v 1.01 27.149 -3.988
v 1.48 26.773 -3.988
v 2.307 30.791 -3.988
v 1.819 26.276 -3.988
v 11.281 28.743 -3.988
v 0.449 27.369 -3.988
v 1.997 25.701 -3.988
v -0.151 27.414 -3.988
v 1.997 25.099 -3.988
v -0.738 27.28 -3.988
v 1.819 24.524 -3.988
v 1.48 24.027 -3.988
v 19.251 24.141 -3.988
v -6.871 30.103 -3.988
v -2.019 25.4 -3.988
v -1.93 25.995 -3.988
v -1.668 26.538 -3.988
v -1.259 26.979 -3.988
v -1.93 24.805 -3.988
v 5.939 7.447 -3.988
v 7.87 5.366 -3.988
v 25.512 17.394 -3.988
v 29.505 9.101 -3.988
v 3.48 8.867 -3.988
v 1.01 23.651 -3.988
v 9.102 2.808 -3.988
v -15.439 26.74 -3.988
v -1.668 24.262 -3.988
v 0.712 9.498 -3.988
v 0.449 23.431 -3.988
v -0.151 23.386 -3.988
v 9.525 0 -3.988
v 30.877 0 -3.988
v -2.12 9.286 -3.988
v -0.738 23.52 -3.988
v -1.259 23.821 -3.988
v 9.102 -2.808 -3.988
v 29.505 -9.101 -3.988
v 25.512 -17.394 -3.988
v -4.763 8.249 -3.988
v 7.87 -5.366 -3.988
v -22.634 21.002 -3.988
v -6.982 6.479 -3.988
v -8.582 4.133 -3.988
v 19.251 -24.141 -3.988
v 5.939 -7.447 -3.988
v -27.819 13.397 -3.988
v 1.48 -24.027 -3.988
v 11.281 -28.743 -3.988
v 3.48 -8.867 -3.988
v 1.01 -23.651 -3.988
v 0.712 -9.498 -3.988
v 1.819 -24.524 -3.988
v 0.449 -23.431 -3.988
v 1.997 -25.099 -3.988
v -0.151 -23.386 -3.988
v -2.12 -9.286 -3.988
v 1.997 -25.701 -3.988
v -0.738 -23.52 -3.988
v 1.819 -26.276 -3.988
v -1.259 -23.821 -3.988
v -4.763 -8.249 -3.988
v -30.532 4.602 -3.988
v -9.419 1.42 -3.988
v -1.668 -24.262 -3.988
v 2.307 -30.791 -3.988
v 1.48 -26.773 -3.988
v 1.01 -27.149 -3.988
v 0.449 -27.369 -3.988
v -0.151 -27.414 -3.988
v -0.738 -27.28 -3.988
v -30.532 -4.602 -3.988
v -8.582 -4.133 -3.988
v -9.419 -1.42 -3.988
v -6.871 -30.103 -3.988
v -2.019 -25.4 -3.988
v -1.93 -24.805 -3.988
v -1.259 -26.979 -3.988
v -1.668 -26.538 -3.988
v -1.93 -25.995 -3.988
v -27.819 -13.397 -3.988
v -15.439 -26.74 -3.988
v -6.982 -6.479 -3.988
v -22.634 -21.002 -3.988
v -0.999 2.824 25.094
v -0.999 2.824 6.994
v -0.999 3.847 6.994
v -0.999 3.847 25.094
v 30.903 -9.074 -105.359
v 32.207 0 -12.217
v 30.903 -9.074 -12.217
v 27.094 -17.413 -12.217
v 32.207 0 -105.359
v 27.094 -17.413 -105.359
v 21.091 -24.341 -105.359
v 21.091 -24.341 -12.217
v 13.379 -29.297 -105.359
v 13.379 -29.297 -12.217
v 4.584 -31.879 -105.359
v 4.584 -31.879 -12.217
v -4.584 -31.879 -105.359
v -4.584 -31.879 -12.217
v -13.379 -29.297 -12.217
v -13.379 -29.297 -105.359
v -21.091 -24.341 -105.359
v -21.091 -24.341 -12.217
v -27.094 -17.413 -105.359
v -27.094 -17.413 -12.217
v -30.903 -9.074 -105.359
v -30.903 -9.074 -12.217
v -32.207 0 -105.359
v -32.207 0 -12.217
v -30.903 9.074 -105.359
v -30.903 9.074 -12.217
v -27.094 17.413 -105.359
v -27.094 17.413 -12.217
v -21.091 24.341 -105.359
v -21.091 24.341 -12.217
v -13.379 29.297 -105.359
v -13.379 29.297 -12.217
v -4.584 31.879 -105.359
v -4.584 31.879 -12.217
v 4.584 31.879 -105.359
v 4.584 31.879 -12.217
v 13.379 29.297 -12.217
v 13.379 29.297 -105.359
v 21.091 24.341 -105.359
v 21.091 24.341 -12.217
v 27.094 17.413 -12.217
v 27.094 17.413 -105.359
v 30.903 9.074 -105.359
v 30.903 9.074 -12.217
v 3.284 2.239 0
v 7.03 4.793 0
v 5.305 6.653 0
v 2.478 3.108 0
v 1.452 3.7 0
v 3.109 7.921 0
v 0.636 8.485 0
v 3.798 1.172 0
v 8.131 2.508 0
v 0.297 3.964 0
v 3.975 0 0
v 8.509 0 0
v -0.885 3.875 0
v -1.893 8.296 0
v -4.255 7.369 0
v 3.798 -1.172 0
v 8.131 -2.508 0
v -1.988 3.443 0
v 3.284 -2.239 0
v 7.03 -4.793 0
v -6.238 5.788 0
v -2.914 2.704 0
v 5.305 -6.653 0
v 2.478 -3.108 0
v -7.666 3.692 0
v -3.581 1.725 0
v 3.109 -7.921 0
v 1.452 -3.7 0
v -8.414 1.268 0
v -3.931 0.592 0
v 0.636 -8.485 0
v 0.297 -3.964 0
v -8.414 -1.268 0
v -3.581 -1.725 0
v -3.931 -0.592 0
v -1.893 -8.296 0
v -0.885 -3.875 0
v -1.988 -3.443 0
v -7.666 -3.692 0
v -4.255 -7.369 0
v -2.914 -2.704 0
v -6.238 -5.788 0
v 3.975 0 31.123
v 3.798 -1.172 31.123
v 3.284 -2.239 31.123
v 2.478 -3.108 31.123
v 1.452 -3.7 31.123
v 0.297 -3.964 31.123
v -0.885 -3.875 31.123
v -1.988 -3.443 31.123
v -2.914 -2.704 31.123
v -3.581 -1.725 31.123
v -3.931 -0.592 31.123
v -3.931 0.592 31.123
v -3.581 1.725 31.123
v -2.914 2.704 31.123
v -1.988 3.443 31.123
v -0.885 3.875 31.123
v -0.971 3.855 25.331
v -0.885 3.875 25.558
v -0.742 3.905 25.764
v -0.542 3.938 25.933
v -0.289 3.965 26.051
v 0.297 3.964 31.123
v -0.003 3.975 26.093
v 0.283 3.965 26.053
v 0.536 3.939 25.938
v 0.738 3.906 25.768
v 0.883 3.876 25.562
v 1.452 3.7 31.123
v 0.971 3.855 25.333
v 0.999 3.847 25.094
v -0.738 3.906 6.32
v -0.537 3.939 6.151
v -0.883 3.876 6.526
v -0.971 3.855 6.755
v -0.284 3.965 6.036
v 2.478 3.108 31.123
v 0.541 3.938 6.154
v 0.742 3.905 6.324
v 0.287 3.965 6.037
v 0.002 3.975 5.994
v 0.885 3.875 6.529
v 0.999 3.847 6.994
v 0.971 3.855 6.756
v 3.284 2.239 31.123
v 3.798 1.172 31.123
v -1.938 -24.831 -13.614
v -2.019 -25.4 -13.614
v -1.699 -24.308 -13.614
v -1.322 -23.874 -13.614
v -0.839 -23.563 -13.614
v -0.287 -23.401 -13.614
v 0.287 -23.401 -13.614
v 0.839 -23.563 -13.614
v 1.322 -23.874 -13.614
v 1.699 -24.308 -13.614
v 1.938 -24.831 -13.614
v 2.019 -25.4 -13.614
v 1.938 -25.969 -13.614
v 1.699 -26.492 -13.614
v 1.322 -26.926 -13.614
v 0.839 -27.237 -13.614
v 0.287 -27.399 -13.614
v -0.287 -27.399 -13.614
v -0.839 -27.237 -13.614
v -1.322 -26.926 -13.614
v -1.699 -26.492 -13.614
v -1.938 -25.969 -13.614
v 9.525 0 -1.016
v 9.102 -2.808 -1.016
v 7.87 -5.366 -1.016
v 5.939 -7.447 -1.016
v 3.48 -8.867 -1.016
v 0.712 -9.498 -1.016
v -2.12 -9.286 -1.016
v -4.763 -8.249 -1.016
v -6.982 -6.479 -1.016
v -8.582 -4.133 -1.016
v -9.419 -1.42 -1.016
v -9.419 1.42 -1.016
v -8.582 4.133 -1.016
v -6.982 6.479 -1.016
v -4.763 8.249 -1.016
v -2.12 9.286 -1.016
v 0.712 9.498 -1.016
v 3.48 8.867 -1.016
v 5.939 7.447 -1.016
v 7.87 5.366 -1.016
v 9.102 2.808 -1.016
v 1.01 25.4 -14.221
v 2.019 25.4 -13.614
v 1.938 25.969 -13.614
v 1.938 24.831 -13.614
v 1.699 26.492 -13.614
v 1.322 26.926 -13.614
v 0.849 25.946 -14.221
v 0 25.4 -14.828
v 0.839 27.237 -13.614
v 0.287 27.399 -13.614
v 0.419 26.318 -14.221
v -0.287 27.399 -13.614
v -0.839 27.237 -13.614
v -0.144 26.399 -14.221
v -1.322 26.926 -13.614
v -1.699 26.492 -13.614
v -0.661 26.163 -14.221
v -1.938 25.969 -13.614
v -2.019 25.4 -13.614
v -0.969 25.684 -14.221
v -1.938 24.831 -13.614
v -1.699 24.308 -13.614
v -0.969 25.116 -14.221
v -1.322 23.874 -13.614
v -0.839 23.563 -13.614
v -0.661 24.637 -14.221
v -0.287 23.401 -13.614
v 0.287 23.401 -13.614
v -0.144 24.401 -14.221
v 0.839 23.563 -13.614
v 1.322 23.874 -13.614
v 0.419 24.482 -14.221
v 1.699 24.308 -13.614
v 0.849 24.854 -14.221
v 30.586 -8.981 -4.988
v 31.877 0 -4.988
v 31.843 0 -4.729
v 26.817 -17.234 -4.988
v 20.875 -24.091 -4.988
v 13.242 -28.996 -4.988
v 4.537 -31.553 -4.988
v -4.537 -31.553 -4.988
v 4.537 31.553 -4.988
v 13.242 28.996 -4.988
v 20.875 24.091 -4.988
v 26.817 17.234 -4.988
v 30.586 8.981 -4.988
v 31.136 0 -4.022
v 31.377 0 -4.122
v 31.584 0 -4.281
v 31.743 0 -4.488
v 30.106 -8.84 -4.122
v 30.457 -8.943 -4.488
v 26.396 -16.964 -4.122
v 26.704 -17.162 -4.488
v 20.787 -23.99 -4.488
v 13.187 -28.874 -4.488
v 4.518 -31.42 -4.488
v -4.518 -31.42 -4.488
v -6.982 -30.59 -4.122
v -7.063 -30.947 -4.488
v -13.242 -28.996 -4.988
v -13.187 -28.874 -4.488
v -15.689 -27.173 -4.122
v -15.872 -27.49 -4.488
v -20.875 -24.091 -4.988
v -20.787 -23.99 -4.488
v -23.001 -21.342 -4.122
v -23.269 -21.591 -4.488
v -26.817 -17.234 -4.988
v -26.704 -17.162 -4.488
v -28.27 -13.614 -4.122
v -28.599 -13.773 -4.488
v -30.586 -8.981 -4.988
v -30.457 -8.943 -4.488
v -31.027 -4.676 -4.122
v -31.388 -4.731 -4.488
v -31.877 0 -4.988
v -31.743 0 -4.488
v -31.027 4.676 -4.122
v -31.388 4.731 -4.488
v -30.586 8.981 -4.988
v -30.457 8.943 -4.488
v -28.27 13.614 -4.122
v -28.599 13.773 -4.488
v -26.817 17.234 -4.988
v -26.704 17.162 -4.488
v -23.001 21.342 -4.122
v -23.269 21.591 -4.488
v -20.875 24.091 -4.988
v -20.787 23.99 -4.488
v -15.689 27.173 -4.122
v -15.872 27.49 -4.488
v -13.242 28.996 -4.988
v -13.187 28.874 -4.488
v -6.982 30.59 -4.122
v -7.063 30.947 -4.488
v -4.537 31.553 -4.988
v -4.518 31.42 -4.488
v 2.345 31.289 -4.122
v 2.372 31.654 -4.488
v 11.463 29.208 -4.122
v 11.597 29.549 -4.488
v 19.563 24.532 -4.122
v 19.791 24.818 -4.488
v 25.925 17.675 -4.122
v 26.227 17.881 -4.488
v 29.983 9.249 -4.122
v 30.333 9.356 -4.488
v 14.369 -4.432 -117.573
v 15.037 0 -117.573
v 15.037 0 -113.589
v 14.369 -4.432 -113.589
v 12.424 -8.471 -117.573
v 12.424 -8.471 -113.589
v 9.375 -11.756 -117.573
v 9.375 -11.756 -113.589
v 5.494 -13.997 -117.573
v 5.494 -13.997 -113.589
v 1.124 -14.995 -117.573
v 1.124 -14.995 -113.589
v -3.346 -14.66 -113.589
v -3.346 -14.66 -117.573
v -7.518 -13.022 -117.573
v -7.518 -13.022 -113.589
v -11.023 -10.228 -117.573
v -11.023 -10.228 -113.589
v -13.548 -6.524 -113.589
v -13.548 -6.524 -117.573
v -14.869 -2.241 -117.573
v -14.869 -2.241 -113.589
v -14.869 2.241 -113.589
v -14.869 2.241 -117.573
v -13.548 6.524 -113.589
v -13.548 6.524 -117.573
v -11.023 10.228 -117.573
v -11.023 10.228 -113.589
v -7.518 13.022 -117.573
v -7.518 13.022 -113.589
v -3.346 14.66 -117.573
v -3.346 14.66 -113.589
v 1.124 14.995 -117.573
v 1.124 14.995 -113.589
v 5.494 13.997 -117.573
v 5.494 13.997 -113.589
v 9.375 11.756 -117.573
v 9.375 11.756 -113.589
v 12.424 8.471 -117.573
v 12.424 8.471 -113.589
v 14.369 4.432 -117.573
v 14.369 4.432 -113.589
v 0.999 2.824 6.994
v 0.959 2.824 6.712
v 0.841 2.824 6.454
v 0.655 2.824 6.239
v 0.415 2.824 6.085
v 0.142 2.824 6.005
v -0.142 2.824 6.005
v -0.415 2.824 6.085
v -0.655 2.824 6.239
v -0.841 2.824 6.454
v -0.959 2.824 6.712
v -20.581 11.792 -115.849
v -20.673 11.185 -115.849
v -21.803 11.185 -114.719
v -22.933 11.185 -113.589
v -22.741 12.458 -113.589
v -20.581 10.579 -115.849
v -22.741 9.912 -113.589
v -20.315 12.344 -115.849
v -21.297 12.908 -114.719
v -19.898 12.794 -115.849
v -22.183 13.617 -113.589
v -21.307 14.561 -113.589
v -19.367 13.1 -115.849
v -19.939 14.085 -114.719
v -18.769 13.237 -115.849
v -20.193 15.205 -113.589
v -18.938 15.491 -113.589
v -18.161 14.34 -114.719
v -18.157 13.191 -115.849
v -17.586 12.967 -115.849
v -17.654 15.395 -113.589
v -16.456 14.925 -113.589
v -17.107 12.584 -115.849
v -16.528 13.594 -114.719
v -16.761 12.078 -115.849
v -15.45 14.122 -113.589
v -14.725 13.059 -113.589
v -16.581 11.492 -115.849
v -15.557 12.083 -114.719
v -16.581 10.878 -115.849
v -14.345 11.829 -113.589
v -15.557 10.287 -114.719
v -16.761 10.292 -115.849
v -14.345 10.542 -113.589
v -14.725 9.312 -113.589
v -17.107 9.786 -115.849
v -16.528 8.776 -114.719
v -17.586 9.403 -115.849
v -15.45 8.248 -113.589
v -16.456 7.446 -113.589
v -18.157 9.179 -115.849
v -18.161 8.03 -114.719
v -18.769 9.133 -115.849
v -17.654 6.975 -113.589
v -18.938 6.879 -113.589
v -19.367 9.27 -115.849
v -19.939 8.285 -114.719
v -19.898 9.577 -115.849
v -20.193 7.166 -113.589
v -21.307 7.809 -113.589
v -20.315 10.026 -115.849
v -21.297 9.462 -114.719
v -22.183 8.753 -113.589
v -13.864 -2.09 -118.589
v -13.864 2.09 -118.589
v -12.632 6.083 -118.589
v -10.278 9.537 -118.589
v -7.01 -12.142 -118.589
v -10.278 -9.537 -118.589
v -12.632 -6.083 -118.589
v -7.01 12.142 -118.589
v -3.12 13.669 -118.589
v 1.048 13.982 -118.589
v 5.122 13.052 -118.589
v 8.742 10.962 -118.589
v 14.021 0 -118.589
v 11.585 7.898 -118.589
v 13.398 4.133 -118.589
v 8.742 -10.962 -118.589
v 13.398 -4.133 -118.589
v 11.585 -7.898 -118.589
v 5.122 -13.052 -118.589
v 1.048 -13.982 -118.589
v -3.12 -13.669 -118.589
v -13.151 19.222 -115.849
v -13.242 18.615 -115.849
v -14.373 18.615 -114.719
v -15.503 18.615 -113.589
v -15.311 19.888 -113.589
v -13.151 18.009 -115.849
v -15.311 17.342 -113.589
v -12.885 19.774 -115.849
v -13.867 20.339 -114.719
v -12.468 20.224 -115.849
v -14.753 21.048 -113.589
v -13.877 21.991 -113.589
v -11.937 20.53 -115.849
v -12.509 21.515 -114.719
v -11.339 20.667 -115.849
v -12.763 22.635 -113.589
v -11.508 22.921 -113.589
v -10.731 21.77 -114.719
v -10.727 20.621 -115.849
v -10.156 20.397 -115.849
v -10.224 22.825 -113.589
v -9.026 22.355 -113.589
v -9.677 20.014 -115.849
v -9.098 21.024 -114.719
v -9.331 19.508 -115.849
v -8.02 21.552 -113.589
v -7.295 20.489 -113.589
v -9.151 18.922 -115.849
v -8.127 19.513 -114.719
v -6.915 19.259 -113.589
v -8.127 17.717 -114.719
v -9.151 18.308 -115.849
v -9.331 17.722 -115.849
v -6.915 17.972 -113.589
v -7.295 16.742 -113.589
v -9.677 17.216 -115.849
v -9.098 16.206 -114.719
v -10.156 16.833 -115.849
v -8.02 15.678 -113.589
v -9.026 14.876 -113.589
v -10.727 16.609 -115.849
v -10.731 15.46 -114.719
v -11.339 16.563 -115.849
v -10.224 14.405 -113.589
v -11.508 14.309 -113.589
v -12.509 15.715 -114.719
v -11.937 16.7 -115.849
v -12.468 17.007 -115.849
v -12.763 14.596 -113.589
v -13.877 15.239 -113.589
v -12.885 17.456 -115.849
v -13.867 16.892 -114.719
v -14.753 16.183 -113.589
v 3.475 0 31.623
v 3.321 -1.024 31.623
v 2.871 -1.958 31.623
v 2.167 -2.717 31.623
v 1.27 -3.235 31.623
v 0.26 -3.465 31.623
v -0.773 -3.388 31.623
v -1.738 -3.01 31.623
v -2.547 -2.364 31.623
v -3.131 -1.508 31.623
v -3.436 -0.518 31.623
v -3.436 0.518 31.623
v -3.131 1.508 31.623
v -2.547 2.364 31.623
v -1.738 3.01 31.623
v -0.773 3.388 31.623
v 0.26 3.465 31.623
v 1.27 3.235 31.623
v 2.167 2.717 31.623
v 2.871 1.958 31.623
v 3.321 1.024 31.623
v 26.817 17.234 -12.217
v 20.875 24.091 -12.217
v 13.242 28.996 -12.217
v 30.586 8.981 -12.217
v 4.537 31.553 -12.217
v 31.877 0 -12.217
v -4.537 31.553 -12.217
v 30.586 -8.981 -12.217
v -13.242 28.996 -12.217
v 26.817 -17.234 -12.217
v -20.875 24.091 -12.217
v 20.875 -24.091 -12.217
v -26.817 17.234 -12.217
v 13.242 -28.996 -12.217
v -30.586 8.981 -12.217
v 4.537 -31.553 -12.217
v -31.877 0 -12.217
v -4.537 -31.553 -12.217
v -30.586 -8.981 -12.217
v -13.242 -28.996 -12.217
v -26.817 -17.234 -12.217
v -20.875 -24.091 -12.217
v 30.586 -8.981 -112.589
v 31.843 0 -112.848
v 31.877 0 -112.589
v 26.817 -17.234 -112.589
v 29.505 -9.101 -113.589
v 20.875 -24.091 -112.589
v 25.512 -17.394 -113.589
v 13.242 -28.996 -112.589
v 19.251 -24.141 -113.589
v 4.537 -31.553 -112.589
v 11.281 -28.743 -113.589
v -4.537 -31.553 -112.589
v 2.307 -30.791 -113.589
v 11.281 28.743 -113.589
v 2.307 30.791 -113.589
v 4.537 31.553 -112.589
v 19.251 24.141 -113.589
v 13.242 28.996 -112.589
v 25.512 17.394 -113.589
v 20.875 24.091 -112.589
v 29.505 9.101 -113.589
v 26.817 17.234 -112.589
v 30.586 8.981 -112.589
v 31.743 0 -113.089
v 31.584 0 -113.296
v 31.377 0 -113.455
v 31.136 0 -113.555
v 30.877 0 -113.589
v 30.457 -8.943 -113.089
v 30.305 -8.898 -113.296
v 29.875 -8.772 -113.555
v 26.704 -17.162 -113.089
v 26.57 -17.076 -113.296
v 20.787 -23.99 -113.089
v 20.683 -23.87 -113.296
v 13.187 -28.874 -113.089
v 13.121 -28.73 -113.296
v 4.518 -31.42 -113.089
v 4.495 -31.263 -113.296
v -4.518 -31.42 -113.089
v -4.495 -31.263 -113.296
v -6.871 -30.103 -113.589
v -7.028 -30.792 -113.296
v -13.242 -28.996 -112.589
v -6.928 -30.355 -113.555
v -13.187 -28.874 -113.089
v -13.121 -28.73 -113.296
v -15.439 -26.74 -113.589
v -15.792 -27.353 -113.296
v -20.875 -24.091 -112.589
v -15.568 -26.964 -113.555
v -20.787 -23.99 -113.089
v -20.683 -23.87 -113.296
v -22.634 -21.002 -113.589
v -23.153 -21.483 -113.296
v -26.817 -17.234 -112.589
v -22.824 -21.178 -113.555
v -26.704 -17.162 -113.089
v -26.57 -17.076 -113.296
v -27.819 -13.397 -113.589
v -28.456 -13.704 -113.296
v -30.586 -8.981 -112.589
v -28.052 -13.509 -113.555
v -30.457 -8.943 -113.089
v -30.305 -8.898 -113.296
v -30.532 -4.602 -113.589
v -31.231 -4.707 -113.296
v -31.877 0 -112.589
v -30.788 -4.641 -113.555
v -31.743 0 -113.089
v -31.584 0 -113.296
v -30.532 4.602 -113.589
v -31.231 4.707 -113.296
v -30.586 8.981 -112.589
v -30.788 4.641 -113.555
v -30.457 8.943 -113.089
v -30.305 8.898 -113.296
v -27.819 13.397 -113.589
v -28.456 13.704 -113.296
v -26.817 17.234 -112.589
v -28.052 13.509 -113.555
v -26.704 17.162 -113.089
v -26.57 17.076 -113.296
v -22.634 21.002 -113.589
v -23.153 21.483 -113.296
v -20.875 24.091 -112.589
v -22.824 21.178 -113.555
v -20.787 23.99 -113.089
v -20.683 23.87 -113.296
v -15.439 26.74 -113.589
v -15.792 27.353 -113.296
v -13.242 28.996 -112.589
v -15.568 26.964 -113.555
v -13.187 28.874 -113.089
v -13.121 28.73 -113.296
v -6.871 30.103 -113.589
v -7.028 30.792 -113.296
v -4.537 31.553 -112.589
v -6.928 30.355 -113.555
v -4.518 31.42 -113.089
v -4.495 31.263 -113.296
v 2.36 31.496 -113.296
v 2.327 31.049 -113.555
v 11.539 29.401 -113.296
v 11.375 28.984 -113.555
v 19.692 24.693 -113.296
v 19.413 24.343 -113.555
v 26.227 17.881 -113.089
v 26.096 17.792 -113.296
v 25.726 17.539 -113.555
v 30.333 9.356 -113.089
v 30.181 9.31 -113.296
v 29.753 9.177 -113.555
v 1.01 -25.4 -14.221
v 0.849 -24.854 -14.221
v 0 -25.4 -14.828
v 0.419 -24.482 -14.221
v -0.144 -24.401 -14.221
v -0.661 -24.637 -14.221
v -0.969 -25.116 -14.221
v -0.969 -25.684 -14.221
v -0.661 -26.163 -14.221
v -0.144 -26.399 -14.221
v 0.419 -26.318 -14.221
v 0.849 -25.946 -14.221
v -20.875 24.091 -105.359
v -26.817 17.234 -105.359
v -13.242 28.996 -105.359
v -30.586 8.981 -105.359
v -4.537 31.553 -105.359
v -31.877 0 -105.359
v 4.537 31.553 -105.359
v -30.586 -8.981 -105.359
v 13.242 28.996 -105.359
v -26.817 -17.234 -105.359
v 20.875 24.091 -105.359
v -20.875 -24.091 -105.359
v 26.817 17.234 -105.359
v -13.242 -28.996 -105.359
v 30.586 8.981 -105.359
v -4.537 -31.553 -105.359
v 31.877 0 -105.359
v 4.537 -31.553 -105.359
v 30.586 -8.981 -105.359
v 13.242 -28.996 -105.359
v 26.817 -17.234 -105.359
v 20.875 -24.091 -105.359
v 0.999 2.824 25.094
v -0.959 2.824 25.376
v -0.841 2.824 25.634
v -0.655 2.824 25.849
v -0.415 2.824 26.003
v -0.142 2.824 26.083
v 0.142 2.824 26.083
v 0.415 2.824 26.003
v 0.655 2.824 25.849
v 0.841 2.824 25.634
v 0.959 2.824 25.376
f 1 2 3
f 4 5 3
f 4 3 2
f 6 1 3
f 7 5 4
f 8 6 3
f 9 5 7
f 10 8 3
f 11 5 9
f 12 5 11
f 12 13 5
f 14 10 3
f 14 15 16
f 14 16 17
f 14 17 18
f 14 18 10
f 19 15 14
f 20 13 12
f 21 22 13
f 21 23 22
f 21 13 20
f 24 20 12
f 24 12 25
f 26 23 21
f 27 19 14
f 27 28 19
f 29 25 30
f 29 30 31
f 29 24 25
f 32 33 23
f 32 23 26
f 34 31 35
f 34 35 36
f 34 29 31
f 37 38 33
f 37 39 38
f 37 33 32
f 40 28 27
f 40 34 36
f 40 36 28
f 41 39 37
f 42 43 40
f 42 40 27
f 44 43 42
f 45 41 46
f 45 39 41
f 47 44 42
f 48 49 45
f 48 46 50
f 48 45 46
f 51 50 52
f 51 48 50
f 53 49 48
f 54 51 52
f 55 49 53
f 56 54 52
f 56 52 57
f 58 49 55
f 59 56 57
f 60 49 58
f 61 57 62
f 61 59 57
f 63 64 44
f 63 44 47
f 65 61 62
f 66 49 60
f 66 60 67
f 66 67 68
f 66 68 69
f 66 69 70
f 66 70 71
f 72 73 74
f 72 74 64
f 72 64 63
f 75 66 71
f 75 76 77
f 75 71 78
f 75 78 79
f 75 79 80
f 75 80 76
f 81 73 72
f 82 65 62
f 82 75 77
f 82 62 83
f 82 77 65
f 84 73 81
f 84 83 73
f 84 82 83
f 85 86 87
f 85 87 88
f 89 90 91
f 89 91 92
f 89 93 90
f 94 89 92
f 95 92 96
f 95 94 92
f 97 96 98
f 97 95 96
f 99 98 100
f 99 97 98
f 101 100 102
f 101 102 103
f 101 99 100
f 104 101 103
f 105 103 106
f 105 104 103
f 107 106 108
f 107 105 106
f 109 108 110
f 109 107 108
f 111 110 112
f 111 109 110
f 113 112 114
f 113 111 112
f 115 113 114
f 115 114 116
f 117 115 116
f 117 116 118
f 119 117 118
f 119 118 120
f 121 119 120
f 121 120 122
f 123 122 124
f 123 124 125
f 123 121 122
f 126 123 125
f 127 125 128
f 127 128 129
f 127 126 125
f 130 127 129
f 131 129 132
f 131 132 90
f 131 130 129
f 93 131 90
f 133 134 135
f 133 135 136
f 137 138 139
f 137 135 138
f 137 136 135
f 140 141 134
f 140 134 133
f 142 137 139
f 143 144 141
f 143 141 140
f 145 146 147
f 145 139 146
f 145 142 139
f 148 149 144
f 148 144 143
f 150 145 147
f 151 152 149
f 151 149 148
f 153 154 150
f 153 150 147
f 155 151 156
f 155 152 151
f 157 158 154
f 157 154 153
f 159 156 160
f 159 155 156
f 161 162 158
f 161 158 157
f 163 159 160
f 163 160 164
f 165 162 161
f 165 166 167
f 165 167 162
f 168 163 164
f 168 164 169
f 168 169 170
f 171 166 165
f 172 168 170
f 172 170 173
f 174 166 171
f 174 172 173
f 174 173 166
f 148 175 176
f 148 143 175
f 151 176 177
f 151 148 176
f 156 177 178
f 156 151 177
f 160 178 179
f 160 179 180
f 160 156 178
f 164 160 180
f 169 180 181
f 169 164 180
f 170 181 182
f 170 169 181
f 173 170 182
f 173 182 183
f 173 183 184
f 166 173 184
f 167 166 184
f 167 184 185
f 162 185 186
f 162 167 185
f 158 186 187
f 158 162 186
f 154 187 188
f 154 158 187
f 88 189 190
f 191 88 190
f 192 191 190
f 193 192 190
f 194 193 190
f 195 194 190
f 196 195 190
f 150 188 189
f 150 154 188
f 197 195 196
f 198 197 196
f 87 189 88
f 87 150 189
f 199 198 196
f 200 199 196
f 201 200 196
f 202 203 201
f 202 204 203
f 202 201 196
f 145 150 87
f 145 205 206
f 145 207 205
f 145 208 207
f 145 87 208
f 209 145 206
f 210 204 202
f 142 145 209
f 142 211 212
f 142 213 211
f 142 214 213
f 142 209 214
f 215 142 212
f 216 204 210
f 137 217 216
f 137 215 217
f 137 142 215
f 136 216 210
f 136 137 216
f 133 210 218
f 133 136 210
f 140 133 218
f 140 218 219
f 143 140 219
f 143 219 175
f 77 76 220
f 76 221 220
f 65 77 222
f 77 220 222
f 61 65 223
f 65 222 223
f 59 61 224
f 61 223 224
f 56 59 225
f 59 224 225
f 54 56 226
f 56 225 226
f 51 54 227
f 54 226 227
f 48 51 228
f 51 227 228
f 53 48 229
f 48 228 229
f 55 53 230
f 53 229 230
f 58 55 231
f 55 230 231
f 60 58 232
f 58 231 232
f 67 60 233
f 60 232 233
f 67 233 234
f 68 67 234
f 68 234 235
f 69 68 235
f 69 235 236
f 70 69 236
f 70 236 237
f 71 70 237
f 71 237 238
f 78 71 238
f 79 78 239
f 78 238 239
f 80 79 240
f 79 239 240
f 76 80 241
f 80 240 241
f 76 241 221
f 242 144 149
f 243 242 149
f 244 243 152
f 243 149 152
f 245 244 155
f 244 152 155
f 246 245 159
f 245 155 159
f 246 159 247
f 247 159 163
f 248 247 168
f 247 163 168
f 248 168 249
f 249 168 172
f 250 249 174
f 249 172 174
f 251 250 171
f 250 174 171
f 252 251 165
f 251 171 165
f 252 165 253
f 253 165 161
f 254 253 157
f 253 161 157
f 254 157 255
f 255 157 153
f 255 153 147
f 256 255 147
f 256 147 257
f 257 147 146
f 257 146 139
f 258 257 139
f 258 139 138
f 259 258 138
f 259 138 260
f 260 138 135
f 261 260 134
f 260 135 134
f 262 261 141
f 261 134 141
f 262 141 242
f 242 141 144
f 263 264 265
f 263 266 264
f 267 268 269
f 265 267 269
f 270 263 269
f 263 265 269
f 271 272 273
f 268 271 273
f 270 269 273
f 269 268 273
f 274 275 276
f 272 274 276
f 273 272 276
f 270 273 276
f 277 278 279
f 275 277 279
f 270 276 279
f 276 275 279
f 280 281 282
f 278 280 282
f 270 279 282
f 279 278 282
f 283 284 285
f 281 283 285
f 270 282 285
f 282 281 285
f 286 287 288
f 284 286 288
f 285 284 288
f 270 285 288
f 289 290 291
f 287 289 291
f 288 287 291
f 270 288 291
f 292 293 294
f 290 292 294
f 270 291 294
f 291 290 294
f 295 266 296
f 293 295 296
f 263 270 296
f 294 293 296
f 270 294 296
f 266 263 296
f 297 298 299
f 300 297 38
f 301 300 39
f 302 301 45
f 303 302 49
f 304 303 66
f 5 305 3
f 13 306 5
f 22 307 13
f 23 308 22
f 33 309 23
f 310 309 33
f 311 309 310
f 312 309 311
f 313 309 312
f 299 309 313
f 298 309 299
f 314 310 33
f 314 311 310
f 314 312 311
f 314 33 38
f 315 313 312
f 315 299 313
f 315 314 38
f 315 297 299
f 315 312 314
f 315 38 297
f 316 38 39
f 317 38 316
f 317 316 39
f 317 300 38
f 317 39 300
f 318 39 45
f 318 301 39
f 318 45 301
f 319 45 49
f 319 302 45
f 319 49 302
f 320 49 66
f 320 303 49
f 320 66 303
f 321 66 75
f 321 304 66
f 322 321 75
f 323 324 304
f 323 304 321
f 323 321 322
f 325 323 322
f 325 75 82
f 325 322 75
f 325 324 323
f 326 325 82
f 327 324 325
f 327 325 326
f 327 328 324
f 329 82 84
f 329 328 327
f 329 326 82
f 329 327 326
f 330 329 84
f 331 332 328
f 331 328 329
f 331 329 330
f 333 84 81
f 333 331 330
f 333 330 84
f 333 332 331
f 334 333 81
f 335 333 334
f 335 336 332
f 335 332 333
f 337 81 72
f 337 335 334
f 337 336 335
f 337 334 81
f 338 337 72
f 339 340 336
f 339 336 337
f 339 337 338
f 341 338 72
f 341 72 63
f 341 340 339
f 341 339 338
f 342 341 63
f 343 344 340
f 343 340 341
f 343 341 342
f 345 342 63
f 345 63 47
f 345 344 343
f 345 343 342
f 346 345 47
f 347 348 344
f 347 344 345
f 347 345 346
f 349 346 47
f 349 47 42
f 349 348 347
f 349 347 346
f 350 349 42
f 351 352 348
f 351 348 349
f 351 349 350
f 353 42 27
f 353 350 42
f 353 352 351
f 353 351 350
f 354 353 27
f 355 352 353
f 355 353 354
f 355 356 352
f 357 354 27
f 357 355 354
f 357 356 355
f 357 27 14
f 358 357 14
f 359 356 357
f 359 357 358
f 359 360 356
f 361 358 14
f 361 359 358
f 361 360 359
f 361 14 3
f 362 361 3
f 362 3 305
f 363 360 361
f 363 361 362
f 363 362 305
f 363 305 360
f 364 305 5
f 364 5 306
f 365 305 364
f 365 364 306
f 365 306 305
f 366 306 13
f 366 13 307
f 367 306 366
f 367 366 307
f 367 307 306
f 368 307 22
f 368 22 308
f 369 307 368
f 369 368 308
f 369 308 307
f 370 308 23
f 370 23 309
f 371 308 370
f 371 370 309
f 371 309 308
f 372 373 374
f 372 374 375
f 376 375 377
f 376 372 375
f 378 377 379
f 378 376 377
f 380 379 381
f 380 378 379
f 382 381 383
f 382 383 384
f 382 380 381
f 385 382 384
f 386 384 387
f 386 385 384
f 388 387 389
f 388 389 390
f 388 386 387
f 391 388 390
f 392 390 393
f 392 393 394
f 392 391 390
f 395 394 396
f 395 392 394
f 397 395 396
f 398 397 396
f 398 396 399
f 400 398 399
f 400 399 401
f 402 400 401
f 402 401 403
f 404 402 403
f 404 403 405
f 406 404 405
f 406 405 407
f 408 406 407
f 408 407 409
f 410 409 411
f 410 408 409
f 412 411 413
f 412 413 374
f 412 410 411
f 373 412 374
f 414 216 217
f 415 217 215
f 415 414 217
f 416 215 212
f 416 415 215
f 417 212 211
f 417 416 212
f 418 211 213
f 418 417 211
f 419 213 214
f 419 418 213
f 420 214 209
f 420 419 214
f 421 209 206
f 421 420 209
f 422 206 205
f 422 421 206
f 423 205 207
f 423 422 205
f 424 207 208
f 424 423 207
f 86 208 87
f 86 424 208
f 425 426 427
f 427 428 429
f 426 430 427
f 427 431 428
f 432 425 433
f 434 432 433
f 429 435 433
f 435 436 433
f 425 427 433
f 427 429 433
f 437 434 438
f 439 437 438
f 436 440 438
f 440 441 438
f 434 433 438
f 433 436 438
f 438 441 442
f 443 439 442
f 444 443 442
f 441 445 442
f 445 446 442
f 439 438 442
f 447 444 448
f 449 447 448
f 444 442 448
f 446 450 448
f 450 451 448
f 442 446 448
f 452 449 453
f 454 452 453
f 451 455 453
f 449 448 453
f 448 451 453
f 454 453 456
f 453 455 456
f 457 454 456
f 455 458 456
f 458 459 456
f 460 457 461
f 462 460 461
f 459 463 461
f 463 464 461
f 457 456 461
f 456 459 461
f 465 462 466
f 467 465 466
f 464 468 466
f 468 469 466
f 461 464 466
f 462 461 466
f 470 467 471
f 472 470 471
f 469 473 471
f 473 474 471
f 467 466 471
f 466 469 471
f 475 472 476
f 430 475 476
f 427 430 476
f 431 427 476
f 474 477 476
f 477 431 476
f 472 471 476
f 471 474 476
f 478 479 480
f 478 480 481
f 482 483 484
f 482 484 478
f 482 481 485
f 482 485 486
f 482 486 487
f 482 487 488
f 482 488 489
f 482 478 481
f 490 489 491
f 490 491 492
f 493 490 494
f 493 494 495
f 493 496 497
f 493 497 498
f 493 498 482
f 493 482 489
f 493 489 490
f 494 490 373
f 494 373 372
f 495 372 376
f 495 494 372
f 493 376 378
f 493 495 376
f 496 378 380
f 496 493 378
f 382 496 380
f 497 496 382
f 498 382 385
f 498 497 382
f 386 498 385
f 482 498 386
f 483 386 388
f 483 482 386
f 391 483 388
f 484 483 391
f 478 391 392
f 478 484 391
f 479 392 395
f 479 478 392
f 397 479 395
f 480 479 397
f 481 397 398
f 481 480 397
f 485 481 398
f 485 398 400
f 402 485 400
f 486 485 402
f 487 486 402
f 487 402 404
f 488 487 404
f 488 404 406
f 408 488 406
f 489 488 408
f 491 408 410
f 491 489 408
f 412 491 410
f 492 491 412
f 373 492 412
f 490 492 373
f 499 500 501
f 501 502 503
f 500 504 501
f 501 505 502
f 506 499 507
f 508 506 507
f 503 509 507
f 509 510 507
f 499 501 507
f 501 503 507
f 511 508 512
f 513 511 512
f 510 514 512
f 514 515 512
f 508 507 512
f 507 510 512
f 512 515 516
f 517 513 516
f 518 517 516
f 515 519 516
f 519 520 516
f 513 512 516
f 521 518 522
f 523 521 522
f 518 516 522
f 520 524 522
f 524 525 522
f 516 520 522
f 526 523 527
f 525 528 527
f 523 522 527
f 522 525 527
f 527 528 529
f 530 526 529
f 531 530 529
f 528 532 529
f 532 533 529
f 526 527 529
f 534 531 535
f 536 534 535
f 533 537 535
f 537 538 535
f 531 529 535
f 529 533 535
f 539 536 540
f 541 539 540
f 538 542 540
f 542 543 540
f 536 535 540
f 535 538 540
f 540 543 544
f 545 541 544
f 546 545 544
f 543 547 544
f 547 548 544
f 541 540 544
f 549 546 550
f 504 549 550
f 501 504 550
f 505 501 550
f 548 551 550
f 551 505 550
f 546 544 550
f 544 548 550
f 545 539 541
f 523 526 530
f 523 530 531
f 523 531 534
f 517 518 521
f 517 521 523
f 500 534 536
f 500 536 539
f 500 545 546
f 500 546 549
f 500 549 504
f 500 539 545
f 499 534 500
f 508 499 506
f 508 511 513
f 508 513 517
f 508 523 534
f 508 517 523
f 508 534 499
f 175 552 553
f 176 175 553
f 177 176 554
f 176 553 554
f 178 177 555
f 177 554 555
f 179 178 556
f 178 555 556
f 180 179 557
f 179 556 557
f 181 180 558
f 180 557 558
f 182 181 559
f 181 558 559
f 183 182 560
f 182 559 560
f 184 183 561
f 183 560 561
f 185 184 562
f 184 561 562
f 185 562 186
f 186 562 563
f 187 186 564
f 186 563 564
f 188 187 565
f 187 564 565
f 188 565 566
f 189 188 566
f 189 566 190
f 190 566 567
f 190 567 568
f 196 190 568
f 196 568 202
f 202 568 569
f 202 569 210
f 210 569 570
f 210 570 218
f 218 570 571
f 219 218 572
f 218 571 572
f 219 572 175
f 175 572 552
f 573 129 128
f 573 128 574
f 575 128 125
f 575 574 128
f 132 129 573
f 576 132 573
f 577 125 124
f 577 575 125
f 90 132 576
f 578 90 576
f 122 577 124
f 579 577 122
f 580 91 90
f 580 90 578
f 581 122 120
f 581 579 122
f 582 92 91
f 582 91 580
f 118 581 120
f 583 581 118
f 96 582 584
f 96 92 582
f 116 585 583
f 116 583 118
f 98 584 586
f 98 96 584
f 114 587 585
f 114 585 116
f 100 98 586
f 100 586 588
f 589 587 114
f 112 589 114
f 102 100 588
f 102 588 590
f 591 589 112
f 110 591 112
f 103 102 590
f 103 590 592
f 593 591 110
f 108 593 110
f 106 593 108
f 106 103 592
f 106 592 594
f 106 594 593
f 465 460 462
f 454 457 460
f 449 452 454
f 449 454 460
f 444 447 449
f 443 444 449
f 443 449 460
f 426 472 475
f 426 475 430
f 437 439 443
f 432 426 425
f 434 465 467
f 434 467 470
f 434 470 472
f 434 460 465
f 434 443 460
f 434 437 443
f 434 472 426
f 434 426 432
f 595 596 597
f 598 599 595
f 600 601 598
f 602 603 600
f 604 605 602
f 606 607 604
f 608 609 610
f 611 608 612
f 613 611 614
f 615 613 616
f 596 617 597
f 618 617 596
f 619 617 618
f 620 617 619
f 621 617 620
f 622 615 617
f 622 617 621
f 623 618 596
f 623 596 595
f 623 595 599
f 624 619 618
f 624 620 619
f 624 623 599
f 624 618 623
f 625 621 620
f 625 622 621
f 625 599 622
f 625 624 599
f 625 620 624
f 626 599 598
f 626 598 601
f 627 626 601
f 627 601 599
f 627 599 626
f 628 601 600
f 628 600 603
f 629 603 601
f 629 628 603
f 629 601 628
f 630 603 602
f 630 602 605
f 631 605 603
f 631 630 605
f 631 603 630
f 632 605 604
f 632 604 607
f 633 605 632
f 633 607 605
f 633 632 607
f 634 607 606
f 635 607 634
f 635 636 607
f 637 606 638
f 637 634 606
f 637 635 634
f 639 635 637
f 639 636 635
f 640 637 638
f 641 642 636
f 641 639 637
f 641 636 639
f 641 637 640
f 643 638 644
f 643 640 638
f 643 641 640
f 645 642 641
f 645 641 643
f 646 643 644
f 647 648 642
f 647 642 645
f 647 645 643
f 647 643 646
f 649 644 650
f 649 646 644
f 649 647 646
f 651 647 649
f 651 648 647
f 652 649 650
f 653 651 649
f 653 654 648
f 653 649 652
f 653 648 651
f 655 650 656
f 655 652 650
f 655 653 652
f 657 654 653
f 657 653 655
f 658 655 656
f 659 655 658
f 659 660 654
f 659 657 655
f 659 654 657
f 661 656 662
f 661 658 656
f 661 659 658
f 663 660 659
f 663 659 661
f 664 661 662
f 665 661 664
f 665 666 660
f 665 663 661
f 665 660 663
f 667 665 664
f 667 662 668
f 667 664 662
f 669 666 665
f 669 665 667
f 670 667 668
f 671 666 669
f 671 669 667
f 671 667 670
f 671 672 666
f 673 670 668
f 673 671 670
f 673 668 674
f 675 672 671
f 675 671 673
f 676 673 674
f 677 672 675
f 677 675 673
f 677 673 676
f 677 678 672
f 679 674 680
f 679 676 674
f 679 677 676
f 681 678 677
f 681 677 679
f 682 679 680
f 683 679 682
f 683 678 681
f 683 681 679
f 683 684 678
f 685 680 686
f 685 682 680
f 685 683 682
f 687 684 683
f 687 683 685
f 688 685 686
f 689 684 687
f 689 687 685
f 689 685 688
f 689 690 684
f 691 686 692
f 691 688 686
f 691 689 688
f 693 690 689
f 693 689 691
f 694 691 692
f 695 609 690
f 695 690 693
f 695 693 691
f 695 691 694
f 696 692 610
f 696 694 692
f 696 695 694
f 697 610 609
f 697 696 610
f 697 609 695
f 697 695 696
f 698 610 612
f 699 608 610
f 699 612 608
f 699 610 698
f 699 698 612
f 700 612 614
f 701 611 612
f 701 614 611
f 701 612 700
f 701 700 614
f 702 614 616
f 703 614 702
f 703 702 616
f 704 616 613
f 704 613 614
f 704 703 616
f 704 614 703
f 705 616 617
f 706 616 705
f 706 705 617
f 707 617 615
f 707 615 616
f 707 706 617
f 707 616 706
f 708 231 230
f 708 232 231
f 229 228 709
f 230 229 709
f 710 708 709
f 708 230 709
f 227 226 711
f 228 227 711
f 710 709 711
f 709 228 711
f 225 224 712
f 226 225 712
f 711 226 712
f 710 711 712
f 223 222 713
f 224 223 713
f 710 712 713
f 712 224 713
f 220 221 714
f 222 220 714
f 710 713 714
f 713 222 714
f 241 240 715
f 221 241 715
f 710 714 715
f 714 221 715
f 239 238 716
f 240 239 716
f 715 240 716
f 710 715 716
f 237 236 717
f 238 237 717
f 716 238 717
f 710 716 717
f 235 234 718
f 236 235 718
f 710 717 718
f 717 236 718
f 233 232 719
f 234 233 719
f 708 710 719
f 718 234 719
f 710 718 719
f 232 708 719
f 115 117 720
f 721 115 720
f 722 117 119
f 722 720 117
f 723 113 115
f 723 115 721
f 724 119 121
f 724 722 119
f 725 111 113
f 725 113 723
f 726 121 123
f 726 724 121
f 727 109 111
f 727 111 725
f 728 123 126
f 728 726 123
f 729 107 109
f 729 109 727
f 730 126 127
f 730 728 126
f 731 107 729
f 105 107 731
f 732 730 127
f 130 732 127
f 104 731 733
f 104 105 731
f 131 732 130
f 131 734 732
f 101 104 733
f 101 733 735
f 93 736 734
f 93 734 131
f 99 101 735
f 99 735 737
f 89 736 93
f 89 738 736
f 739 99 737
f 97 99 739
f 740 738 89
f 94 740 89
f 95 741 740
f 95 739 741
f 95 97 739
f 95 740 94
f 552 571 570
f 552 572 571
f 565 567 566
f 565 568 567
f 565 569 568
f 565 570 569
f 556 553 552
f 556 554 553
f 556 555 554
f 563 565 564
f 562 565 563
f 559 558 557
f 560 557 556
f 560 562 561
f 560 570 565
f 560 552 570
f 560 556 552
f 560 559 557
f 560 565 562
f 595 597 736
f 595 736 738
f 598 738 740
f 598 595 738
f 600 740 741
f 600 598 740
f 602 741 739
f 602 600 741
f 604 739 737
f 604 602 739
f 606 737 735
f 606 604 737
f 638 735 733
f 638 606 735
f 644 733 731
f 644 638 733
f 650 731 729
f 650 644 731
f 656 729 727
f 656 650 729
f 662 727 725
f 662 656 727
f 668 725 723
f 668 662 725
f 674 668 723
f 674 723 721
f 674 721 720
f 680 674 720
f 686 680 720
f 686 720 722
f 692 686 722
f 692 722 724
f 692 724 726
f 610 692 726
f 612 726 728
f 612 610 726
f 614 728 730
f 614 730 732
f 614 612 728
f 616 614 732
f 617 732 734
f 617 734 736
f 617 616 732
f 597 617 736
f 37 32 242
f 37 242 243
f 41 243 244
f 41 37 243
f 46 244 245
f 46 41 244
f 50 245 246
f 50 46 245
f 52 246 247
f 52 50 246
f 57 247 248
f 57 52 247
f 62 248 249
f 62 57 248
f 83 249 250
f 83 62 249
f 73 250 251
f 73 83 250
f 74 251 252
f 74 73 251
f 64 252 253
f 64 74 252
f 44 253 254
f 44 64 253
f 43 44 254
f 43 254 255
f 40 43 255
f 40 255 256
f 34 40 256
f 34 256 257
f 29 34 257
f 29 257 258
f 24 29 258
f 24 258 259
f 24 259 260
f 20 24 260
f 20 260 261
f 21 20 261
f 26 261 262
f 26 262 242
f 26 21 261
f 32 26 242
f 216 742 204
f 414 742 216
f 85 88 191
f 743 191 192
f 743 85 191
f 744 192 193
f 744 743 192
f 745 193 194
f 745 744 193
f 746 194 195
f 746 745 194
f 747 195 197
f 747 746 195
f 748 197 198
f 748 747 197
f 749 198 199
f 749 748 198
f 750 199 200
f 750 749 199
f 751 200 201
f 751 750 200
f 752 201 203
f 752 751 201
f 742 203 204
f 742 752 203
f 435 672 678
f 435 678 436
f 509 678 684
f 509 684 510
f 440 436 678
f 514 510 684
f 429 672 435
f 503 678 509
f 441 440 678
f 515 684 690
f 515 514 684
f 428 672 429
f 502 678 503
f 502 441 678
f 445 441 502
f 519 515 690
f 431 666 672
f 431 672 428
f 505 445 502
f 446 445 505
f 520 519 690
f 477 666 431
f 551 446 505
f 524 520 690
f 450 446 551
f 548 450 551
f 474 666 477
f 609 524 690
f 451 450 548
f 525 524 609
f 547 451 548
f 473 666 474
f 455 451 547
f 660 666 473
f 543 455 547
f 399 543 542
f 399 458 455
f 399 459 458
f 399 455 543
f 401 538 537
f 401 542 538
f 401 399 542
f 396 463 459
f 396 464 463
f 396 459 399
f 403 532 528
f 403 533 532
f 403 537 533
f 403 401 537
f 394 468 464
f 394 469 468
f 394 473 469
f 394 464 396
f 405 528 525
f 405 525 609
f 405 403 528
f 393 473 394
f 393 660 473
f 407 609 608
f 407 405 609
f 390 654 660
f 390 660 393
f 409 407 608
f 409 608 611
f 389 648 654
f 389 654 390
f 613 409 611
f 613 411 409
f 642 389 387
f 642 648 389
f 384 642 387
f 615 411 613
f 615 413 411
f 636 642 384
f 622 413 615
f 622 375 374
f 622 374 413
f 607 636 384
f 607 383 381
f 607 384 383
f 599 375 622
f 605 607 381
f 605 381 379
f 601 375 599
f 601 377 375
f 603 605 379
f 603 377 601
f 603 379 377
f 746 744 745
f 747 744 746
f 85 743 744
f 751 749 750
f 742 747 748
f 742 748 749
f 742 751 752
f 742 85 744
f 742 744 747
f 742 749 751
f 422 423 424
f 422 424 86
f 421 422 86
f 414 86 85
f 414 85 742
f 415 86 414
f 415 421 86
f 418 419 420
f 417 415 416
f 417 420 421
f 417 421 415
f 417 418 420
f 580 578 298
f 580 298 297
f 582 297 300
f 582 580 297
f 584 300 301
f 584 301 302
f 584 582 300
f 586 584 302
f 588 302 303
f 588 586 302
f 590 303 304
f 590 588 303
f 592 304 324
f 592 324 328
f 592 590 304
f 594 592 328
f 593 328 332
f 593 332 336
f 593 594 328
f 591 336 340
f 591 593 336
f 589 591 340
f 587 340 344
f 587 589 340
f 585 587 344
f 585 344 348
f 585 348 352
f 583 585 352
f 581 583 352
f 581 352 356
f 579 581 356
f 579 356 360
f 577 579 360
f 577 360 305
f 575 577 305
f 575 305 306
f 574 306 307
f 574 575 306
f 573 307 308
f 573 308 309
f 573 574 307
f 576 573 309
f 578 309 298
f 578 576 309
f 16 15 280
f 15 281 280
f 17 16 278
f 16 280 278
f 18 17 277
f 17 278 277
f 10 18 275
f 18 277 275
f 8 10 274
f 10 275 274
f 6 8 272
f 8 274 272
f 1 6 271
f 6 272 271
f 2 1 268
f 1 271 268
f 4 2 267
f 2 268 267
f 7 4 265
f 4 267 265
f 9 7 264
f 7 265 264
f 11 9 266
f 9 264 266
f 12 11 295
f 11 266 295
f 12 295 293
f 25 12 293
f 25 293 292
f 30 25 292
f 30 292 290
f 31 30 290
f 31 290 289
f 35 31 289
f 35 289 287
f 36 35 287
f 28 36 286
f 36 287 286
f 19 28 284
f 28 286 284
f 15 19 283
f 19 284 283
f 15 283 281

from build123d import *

# Parameters (mm, degrees)
FILLET1_R                     = 1
CHAMFER1_SIZE                 = 1.016
CHAMFER2_SIZE                 = 0.5
F_10_32_TAPPED_HOLE1_D        = 4.0386
F_10_32_TAPPED_HOLE1_DEPTH    = 13.6144
F_10_32_TAPPED_HOLE1_TIP      = 1.213317848
CUT_EXTRUDE1_START            = -6.79958
CUT_EXTRUDE1_DEPTH            = 122.301029095
SKETCH5_R                     = 4.318
BOSS_EXTRUDE1_DEPTH           = 2.2606
BOSS_EXTRUDE1_DRAFT           = 45
BOSS_EXTRUDE1_PROFILE_2_DEPTH = 2.2606
BOSS_EXTRUDE1_PROFILE_2_DRAFT = 45


with BuildPart() as part:
    # Sketch1 → Revolve1 (revolve)
    with BuildSketch(Plane(origin=(0, 0, 0), x_dir=(0, 0, -1), z_dir=(1, 0, 0)), mode=Mode.PRIVATE) as revolve1_sk:
        Polygon((-31.623, 0), (-31.623, 3.9751), (0, 3.9751), (0, 9.525), (3.9878, 9.525), (3.9878, 31.877), (12.2174, 31.877), (12.2174, 32.2072), (105.3592, 32.2072), (105.3592, 31.877), (113.5888, 31.877), (113.5888, 15.0368), (118.5888, 15.0368), (118.5888, 0), align=None)
    revolve(revolve1_sk.sketch.rotate(Axis((0, 0, 111.866494726), (0, 0, -1)), 90), axis=Axis((0, 0, 111.866494726), (0, 0, -1)))

    # Fillet1
    fillet1_edges = [part.edges().sort_by_distance(p)[0] for p in [
        (-31.877, 0, -113.5888),
        (-31.877, 0, -3.9878),
    ]]
    fillet(fillet1_edges, radius=FILLET1_R)

    # Chamfer1
    chamfer1_edges = [part.edges().sort_by_distance(p)[0] for p in [
        (-9.525, 0, 0),
        (-15.0368, 0, -118.5888),
    ]]
    chamfer(chamfer1_edges, length=CHAMFER1_SIZE)

    # Chamfer2
    chamfer2_edges = [part.edges().sort_by_distance(p)[0] for p in [
        (-3.9751, 0, 31.623),
    ]]
    chamfer(chamfer2_edges, length=CHAMFER2_SIZE)

    # #10-32 Tapped Hole1
    with Locations(Plane.XY):
        with Locations((0, 25.4), (0, -25.4)):
            Hole(F_10_32_TAPPED_HOLE1_D / 2, depth=F_10_32_TAPPED_HOLE1_DEPTH)
            with Locations((0, 0, -(F_10_32_TAPPED_HOLE1_DEPTH + F_10_32_TAPPED_HOLE1_TIP / 2))):  # 118° drill point
                Cone(0, F_10_32_TAPPED_HOLE1_D / 2, F_10_32_TAPPED_HOLE1_TIP, mode=Mode.SUBTRACT)

    # Sketch4 → Cut-Extrude1 (cut, through all)
    with BuildSketch(Plane(origin=(0, -3.9751, 0), x_dir=(-1, 0, 0), z_dir=(0, -1, 0)).offset(CUT_EXTRUDE1_START)):
        with BuildLine():
            Line((0.99949, -6.99389), (0.99949, -25.09393))
            ThreePointArc((0.99949, -25.09393), (0, -26.09342), (-0.99949, -25.09393))
            Line((-0.99949, -25.09393), (-0.99949, -6.99389))
            ThreePointArc((-0.99949, -6.99389), (0, -5.9944), (0.99949, -6.99389))
        make_face()
    extrude(amount=-CUT_EXTRUDE1_DEPTH, mode=Mode.SUBTRACT)


with BuildPart() as boss_extrude1_tool:
    # Sketch5 → Boss-Extrude1 (with draft: the straight prism first)
    with BuildSketch(Plane(origin=(0, 0, -113.5888), x_dir=(-1, 0, 0), z_dir=(0, 0, -1))):
        with Locations((11.185081873, 18.615102269)):
            Circle(SKETCH5_R)
    extrude(amount=BOSS_EXTRUDE1_DEPTH)
    # Boss-Extrude1: the draft: its side faces are tilted about the plane it starts from
    boss_extrude1_sides = [boss_extrude1_tool.faces().sort_by_distance(p)[0] for p in [
        (-6.867081873, 18.615102269, -114.7191),
    ]]
    draft(boss_extrude1_sides, Plane(origin=(0, 0, -113.5888), x_dir=(-1, 0, 0), z_dir=(0, 0, -1)), BOSS_EXTRUDE1_DRAFT)


with BuildPart() as part_1:
    add(part.part)

    # Boss-Extrude1: add boss_extrude1_tool
    add(boss_extrude1_tool.part)


with BuildPart() as boss_extrude1_profile_2_tool:
    # Sketch5 → Boss-Extrude1 profile 2 (with draft: the straight prism first)
    with BuildSketch(Plane(origin=(0, 0, -113.5888), x_dir=(-1, 0, 0), z_dir=(0, 0, -1))):
        with Locations((18.615102269, 11.185081873)):
            Circle(SKETCH5_R)
    extrude(amount=BOSS_EXTRUDE1_PROFILE_2_DEPTH)
    # Boss-Extrude1 profile 2: the draft: its side faces are tilted about the plane it starts from
    boss_extrude1_profile_2_sides = [boss_extrude1_profile_2_tool.faces().sort_by_distance(p)[0] for p in [
        (-14.297102269, 11.185081873, -114.7191),
    ]]
    draft(boss_extrude1_profile_2_sides, Plane(origin=(0, 0, -113.5888), x_dir=(-1, 0, 0), z_dir=(0, 0, -1)), BOSS_EXTRUDE1_PROFILE_2_DRAFT)


with BuildPart() as part_2:
    add(part_1.part)

    # Boss-Extrude1 profile 2: add boss_extrude1_profile_2_tool
    add(boss_extrude1_profile_2_tool.part)


solid = part_2.part
